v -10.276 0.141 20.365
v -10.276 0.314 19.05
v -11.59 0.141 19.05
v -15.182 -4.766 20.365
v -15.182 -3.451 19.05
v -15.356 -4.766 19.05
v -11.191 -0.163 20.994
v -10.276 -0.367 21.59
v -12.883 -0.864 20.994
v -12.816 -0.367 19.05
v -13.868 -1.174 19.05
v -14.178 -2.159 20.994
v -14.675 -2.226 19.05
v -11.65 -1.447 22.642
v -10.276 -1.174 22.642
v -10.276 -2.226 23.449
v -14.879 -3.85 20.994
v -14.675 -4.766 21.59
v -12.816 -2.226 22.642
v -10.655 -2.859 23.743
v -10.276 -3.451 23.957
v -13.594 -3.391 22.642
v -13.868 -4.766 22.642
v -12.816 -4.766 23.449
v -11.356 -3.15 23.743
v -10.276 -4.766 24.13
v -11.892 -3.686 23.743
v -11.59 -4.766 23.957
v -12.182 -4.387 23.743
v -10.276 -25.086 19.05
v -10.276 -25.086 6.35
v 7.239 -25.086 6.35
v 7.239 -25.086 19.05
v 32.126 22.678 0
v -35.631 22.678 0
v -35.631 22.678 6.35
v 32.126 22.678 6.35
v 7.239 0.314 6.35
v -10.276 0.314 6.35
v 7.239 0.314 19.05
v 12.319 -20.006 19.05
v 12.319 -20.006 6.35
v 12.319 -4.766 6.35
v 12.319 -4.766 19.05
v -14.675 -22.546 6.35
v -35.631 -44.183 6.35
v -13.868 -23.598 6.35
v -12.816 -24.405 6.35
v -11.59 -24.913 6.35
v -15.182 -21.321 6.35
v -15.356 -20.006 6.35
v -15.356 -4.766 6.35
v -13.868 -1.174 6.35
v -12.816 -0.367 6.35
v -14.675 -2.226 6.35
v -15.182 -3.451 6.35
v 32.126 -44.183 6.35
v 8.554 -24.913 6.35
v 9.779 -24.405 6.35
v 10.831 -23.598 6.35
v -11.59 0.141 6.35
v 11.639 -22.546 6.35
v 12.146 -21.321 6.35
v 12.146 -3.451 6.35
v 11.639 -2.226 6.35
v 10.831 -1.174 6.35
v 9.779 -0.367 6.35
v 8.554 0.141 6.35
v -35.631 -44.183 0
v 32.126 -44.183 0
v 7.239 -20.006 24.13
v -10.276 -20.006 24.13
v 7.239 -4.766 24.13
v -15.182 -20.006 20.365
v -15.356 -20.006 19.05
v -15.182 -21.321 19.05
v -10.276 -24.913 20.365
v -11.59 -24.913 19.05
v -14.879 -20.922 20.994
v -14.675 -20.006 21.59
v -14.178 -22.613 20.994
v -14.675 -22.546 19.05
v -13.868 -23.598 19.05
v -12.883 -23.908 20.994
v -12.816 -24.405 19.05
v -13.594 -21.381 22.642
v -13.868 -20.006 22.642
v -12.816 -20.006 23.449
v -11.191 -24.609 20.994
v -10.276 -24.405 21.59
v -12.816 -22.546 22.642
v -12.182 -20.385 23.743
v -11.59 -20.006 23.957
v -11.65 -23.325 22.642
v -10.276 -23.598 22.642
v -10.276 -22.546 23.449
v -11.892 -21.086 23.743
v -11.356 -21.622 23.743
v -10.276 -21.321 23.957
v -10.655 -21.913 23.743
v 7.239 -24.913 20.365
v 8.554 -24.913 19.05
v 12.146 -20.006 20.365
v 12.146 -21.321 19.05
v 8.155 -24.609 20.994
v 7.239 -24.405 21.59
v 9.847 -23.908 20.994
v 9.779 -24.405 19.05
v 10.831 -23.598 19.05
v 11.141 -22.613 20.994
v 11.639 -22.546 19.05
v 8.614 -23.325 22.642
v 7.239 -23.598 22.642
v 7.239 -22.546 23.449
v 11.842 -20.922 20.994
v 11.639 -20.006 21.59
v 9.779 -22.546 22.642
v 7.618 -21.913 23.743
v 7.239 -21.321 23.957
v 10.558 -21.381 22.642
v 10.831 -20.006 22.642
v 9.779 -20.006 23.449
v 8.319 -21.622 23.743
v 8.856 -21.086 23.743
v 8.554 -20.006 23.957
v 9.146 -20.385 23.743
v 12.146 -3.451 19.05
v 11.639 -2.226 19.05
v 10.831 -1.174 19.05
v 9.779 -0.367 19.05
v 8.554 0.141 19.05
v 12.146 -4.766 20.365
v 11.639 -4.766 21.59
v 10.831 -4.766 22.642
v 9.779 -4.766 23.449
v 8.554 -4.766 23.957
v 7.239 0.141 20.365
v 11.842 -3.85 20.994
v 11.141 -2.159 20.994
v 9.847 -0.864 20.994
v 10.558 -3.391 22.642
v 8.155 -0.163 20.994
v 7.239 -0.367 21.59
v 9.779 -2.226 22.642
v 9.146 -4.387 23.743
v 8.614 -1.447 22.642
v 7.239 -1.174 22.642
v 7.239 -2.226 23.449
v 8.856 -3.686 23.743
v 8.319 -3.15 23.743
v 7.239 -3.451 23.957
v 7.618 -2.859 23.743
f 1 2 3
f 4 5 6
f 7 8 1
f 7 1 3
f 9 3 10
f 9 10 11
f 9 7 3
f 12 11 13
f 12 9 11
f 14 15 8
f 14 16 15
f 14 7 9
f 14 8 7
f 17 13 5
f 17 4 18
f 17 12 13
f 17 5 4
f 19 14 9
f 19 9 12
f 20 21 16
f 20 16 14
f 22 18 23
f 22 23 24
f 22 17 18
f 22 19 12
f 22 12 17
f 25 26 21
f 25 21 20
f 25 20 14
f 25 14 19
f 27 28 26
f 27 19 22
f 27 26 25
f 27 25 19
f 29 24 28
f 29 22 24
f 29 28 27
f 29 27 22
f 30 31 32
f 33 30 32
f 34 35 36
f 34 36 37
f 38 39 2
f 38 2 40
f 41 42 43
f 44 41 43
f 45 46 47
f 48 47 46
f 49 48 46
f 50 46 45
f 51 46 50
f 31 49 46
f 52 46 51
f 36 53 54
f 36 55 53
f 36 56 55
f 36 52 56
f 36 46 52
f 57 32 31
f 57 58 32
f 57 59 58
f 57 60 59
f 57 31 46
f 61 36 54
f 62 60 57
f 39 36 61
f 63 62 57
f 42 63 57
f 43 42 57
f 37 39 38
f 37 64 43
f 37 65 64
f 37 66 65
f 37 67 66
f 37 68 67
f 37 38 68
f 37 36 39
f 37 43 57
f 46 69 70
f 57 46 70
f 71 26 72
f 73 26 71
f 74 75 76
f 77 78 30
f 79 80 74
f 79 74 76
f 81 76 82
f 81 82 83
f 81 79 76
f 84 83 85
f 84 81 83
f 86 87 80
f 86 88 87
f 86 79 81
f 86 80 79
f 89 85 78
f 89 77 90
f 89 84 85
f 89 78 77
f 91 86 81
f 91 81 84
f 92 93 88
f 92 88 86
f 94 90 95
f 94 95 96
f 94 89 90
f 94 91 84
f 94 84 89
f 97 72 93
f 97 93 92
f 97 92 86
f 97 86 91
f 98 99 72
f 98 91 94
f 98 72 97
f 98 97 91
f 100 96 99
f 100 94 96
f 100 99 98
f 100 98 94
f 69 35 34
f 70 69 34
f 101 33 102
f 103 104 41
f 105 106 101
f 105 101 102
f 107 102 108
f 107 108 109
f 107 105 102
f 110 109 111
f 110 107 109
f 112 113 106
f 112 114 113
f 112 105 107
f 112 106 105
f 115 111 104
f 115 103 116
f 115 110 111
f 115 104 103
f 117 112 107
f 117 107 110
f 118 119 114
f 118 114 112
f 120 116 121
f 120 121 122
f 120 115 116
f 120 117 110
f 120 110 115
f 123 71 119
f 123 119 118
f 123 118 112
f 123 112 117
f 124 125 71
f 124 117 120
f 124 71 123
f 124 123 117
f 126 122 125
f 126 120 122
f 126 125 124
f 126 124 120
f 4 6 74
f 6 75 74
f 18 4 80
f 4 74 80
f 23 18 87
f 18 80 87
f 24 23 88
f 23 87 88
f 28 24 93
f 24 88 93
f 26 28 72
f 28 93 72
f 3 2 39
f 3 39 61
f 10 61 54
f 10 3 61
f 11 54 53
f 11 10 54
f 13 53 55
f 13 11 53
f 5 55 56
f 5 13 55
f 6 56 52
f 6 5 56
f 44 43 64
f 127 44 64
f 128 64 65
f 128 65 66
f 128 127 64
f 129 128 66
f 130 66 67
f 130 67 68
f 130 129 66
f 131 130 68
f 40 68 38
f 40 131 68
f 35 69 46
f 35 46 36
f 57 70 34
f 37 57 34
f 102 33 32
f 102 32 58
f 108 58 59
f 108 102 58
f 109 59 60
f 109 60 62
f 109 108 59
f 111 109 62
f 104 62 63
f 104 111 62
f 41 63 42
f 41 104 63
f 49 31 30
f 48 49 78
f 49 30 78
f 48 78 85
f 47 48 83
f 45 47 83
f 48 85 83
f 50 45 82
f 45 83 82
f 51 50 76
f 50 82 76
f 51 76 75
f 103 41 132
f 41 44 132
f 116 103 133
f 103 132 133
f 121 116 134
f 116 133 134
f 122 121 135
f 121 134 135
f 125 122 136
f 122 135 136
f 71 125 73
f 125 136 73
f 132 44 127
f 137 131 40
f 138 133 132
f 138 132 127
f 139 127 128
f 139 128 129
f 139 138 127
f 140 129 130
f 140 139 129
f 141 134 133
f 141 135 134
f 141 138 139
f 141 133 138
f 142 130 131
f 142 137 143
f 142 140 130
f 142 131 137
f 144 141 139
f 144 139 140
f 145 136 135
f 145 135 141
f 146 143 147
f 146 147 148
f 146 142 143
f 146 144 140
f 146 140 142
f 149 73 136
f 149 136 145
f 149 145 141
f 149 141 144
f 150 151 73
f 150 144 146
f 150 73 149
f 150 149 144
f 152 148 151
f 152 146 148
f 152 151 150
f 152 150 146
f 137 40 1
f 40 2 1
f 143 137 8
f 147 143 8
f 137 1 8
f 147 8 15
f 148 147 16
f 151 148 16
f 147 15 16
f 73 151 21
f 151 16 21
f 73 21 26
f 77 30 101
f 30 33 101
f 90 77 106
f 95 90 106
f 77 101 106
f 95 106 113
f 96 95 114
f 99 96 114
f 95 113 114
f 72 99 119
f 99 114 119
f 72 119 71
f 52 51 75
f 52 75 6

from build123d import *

# Parameters (mm, degrees)
F0_W     = 67.757116
F0_H     = 66.861842
F1_DEPTH = 6.35
F2_W     = 27.674626
F2_H     = 25.4
F3_DEPTH = 17.78
F4_R     = 5.08
F5_R     = 5.08


with BuildPart() as f1:
    # F0 (on Top) → F1 (new body)
    with BuildSketch(Plane.XY):
        with Locations((-1.752707, -10.752427)):
            Rectangle(F0_W, F0_H)
    extrude(amount=F1_DEPTH)

    # F2 (on face) → F3 (join)
    with BuildSketch(Plane.XY.offset(6.35)):
        with Locations((-1.518216, -12.386003)):
            Rectangle(F2_W, F2_H)
    extrude(amount=F3_DEPTH)

    # F4
    f4_edges = [f1.edges().sort_by_distance(p)[0] for p in [
        (12.319097, -25.086003, 15.24),
        (-15.355529, -25.086003, 15.24),
        (-15.355529, 0.313997, 15.24),
        (12.319097, 0.313997, 15.24),
    ]]
    fillet(f4_edges, radius=F4_R)

    # F5
    f5_edges = [f1.edges().sort_by_distance(p)[0] for p in [
        (-1.518216, -25.086003, 24.13),
    ]]
    fillet(f5_edges, radius=F5_R)


solid = f1.part
